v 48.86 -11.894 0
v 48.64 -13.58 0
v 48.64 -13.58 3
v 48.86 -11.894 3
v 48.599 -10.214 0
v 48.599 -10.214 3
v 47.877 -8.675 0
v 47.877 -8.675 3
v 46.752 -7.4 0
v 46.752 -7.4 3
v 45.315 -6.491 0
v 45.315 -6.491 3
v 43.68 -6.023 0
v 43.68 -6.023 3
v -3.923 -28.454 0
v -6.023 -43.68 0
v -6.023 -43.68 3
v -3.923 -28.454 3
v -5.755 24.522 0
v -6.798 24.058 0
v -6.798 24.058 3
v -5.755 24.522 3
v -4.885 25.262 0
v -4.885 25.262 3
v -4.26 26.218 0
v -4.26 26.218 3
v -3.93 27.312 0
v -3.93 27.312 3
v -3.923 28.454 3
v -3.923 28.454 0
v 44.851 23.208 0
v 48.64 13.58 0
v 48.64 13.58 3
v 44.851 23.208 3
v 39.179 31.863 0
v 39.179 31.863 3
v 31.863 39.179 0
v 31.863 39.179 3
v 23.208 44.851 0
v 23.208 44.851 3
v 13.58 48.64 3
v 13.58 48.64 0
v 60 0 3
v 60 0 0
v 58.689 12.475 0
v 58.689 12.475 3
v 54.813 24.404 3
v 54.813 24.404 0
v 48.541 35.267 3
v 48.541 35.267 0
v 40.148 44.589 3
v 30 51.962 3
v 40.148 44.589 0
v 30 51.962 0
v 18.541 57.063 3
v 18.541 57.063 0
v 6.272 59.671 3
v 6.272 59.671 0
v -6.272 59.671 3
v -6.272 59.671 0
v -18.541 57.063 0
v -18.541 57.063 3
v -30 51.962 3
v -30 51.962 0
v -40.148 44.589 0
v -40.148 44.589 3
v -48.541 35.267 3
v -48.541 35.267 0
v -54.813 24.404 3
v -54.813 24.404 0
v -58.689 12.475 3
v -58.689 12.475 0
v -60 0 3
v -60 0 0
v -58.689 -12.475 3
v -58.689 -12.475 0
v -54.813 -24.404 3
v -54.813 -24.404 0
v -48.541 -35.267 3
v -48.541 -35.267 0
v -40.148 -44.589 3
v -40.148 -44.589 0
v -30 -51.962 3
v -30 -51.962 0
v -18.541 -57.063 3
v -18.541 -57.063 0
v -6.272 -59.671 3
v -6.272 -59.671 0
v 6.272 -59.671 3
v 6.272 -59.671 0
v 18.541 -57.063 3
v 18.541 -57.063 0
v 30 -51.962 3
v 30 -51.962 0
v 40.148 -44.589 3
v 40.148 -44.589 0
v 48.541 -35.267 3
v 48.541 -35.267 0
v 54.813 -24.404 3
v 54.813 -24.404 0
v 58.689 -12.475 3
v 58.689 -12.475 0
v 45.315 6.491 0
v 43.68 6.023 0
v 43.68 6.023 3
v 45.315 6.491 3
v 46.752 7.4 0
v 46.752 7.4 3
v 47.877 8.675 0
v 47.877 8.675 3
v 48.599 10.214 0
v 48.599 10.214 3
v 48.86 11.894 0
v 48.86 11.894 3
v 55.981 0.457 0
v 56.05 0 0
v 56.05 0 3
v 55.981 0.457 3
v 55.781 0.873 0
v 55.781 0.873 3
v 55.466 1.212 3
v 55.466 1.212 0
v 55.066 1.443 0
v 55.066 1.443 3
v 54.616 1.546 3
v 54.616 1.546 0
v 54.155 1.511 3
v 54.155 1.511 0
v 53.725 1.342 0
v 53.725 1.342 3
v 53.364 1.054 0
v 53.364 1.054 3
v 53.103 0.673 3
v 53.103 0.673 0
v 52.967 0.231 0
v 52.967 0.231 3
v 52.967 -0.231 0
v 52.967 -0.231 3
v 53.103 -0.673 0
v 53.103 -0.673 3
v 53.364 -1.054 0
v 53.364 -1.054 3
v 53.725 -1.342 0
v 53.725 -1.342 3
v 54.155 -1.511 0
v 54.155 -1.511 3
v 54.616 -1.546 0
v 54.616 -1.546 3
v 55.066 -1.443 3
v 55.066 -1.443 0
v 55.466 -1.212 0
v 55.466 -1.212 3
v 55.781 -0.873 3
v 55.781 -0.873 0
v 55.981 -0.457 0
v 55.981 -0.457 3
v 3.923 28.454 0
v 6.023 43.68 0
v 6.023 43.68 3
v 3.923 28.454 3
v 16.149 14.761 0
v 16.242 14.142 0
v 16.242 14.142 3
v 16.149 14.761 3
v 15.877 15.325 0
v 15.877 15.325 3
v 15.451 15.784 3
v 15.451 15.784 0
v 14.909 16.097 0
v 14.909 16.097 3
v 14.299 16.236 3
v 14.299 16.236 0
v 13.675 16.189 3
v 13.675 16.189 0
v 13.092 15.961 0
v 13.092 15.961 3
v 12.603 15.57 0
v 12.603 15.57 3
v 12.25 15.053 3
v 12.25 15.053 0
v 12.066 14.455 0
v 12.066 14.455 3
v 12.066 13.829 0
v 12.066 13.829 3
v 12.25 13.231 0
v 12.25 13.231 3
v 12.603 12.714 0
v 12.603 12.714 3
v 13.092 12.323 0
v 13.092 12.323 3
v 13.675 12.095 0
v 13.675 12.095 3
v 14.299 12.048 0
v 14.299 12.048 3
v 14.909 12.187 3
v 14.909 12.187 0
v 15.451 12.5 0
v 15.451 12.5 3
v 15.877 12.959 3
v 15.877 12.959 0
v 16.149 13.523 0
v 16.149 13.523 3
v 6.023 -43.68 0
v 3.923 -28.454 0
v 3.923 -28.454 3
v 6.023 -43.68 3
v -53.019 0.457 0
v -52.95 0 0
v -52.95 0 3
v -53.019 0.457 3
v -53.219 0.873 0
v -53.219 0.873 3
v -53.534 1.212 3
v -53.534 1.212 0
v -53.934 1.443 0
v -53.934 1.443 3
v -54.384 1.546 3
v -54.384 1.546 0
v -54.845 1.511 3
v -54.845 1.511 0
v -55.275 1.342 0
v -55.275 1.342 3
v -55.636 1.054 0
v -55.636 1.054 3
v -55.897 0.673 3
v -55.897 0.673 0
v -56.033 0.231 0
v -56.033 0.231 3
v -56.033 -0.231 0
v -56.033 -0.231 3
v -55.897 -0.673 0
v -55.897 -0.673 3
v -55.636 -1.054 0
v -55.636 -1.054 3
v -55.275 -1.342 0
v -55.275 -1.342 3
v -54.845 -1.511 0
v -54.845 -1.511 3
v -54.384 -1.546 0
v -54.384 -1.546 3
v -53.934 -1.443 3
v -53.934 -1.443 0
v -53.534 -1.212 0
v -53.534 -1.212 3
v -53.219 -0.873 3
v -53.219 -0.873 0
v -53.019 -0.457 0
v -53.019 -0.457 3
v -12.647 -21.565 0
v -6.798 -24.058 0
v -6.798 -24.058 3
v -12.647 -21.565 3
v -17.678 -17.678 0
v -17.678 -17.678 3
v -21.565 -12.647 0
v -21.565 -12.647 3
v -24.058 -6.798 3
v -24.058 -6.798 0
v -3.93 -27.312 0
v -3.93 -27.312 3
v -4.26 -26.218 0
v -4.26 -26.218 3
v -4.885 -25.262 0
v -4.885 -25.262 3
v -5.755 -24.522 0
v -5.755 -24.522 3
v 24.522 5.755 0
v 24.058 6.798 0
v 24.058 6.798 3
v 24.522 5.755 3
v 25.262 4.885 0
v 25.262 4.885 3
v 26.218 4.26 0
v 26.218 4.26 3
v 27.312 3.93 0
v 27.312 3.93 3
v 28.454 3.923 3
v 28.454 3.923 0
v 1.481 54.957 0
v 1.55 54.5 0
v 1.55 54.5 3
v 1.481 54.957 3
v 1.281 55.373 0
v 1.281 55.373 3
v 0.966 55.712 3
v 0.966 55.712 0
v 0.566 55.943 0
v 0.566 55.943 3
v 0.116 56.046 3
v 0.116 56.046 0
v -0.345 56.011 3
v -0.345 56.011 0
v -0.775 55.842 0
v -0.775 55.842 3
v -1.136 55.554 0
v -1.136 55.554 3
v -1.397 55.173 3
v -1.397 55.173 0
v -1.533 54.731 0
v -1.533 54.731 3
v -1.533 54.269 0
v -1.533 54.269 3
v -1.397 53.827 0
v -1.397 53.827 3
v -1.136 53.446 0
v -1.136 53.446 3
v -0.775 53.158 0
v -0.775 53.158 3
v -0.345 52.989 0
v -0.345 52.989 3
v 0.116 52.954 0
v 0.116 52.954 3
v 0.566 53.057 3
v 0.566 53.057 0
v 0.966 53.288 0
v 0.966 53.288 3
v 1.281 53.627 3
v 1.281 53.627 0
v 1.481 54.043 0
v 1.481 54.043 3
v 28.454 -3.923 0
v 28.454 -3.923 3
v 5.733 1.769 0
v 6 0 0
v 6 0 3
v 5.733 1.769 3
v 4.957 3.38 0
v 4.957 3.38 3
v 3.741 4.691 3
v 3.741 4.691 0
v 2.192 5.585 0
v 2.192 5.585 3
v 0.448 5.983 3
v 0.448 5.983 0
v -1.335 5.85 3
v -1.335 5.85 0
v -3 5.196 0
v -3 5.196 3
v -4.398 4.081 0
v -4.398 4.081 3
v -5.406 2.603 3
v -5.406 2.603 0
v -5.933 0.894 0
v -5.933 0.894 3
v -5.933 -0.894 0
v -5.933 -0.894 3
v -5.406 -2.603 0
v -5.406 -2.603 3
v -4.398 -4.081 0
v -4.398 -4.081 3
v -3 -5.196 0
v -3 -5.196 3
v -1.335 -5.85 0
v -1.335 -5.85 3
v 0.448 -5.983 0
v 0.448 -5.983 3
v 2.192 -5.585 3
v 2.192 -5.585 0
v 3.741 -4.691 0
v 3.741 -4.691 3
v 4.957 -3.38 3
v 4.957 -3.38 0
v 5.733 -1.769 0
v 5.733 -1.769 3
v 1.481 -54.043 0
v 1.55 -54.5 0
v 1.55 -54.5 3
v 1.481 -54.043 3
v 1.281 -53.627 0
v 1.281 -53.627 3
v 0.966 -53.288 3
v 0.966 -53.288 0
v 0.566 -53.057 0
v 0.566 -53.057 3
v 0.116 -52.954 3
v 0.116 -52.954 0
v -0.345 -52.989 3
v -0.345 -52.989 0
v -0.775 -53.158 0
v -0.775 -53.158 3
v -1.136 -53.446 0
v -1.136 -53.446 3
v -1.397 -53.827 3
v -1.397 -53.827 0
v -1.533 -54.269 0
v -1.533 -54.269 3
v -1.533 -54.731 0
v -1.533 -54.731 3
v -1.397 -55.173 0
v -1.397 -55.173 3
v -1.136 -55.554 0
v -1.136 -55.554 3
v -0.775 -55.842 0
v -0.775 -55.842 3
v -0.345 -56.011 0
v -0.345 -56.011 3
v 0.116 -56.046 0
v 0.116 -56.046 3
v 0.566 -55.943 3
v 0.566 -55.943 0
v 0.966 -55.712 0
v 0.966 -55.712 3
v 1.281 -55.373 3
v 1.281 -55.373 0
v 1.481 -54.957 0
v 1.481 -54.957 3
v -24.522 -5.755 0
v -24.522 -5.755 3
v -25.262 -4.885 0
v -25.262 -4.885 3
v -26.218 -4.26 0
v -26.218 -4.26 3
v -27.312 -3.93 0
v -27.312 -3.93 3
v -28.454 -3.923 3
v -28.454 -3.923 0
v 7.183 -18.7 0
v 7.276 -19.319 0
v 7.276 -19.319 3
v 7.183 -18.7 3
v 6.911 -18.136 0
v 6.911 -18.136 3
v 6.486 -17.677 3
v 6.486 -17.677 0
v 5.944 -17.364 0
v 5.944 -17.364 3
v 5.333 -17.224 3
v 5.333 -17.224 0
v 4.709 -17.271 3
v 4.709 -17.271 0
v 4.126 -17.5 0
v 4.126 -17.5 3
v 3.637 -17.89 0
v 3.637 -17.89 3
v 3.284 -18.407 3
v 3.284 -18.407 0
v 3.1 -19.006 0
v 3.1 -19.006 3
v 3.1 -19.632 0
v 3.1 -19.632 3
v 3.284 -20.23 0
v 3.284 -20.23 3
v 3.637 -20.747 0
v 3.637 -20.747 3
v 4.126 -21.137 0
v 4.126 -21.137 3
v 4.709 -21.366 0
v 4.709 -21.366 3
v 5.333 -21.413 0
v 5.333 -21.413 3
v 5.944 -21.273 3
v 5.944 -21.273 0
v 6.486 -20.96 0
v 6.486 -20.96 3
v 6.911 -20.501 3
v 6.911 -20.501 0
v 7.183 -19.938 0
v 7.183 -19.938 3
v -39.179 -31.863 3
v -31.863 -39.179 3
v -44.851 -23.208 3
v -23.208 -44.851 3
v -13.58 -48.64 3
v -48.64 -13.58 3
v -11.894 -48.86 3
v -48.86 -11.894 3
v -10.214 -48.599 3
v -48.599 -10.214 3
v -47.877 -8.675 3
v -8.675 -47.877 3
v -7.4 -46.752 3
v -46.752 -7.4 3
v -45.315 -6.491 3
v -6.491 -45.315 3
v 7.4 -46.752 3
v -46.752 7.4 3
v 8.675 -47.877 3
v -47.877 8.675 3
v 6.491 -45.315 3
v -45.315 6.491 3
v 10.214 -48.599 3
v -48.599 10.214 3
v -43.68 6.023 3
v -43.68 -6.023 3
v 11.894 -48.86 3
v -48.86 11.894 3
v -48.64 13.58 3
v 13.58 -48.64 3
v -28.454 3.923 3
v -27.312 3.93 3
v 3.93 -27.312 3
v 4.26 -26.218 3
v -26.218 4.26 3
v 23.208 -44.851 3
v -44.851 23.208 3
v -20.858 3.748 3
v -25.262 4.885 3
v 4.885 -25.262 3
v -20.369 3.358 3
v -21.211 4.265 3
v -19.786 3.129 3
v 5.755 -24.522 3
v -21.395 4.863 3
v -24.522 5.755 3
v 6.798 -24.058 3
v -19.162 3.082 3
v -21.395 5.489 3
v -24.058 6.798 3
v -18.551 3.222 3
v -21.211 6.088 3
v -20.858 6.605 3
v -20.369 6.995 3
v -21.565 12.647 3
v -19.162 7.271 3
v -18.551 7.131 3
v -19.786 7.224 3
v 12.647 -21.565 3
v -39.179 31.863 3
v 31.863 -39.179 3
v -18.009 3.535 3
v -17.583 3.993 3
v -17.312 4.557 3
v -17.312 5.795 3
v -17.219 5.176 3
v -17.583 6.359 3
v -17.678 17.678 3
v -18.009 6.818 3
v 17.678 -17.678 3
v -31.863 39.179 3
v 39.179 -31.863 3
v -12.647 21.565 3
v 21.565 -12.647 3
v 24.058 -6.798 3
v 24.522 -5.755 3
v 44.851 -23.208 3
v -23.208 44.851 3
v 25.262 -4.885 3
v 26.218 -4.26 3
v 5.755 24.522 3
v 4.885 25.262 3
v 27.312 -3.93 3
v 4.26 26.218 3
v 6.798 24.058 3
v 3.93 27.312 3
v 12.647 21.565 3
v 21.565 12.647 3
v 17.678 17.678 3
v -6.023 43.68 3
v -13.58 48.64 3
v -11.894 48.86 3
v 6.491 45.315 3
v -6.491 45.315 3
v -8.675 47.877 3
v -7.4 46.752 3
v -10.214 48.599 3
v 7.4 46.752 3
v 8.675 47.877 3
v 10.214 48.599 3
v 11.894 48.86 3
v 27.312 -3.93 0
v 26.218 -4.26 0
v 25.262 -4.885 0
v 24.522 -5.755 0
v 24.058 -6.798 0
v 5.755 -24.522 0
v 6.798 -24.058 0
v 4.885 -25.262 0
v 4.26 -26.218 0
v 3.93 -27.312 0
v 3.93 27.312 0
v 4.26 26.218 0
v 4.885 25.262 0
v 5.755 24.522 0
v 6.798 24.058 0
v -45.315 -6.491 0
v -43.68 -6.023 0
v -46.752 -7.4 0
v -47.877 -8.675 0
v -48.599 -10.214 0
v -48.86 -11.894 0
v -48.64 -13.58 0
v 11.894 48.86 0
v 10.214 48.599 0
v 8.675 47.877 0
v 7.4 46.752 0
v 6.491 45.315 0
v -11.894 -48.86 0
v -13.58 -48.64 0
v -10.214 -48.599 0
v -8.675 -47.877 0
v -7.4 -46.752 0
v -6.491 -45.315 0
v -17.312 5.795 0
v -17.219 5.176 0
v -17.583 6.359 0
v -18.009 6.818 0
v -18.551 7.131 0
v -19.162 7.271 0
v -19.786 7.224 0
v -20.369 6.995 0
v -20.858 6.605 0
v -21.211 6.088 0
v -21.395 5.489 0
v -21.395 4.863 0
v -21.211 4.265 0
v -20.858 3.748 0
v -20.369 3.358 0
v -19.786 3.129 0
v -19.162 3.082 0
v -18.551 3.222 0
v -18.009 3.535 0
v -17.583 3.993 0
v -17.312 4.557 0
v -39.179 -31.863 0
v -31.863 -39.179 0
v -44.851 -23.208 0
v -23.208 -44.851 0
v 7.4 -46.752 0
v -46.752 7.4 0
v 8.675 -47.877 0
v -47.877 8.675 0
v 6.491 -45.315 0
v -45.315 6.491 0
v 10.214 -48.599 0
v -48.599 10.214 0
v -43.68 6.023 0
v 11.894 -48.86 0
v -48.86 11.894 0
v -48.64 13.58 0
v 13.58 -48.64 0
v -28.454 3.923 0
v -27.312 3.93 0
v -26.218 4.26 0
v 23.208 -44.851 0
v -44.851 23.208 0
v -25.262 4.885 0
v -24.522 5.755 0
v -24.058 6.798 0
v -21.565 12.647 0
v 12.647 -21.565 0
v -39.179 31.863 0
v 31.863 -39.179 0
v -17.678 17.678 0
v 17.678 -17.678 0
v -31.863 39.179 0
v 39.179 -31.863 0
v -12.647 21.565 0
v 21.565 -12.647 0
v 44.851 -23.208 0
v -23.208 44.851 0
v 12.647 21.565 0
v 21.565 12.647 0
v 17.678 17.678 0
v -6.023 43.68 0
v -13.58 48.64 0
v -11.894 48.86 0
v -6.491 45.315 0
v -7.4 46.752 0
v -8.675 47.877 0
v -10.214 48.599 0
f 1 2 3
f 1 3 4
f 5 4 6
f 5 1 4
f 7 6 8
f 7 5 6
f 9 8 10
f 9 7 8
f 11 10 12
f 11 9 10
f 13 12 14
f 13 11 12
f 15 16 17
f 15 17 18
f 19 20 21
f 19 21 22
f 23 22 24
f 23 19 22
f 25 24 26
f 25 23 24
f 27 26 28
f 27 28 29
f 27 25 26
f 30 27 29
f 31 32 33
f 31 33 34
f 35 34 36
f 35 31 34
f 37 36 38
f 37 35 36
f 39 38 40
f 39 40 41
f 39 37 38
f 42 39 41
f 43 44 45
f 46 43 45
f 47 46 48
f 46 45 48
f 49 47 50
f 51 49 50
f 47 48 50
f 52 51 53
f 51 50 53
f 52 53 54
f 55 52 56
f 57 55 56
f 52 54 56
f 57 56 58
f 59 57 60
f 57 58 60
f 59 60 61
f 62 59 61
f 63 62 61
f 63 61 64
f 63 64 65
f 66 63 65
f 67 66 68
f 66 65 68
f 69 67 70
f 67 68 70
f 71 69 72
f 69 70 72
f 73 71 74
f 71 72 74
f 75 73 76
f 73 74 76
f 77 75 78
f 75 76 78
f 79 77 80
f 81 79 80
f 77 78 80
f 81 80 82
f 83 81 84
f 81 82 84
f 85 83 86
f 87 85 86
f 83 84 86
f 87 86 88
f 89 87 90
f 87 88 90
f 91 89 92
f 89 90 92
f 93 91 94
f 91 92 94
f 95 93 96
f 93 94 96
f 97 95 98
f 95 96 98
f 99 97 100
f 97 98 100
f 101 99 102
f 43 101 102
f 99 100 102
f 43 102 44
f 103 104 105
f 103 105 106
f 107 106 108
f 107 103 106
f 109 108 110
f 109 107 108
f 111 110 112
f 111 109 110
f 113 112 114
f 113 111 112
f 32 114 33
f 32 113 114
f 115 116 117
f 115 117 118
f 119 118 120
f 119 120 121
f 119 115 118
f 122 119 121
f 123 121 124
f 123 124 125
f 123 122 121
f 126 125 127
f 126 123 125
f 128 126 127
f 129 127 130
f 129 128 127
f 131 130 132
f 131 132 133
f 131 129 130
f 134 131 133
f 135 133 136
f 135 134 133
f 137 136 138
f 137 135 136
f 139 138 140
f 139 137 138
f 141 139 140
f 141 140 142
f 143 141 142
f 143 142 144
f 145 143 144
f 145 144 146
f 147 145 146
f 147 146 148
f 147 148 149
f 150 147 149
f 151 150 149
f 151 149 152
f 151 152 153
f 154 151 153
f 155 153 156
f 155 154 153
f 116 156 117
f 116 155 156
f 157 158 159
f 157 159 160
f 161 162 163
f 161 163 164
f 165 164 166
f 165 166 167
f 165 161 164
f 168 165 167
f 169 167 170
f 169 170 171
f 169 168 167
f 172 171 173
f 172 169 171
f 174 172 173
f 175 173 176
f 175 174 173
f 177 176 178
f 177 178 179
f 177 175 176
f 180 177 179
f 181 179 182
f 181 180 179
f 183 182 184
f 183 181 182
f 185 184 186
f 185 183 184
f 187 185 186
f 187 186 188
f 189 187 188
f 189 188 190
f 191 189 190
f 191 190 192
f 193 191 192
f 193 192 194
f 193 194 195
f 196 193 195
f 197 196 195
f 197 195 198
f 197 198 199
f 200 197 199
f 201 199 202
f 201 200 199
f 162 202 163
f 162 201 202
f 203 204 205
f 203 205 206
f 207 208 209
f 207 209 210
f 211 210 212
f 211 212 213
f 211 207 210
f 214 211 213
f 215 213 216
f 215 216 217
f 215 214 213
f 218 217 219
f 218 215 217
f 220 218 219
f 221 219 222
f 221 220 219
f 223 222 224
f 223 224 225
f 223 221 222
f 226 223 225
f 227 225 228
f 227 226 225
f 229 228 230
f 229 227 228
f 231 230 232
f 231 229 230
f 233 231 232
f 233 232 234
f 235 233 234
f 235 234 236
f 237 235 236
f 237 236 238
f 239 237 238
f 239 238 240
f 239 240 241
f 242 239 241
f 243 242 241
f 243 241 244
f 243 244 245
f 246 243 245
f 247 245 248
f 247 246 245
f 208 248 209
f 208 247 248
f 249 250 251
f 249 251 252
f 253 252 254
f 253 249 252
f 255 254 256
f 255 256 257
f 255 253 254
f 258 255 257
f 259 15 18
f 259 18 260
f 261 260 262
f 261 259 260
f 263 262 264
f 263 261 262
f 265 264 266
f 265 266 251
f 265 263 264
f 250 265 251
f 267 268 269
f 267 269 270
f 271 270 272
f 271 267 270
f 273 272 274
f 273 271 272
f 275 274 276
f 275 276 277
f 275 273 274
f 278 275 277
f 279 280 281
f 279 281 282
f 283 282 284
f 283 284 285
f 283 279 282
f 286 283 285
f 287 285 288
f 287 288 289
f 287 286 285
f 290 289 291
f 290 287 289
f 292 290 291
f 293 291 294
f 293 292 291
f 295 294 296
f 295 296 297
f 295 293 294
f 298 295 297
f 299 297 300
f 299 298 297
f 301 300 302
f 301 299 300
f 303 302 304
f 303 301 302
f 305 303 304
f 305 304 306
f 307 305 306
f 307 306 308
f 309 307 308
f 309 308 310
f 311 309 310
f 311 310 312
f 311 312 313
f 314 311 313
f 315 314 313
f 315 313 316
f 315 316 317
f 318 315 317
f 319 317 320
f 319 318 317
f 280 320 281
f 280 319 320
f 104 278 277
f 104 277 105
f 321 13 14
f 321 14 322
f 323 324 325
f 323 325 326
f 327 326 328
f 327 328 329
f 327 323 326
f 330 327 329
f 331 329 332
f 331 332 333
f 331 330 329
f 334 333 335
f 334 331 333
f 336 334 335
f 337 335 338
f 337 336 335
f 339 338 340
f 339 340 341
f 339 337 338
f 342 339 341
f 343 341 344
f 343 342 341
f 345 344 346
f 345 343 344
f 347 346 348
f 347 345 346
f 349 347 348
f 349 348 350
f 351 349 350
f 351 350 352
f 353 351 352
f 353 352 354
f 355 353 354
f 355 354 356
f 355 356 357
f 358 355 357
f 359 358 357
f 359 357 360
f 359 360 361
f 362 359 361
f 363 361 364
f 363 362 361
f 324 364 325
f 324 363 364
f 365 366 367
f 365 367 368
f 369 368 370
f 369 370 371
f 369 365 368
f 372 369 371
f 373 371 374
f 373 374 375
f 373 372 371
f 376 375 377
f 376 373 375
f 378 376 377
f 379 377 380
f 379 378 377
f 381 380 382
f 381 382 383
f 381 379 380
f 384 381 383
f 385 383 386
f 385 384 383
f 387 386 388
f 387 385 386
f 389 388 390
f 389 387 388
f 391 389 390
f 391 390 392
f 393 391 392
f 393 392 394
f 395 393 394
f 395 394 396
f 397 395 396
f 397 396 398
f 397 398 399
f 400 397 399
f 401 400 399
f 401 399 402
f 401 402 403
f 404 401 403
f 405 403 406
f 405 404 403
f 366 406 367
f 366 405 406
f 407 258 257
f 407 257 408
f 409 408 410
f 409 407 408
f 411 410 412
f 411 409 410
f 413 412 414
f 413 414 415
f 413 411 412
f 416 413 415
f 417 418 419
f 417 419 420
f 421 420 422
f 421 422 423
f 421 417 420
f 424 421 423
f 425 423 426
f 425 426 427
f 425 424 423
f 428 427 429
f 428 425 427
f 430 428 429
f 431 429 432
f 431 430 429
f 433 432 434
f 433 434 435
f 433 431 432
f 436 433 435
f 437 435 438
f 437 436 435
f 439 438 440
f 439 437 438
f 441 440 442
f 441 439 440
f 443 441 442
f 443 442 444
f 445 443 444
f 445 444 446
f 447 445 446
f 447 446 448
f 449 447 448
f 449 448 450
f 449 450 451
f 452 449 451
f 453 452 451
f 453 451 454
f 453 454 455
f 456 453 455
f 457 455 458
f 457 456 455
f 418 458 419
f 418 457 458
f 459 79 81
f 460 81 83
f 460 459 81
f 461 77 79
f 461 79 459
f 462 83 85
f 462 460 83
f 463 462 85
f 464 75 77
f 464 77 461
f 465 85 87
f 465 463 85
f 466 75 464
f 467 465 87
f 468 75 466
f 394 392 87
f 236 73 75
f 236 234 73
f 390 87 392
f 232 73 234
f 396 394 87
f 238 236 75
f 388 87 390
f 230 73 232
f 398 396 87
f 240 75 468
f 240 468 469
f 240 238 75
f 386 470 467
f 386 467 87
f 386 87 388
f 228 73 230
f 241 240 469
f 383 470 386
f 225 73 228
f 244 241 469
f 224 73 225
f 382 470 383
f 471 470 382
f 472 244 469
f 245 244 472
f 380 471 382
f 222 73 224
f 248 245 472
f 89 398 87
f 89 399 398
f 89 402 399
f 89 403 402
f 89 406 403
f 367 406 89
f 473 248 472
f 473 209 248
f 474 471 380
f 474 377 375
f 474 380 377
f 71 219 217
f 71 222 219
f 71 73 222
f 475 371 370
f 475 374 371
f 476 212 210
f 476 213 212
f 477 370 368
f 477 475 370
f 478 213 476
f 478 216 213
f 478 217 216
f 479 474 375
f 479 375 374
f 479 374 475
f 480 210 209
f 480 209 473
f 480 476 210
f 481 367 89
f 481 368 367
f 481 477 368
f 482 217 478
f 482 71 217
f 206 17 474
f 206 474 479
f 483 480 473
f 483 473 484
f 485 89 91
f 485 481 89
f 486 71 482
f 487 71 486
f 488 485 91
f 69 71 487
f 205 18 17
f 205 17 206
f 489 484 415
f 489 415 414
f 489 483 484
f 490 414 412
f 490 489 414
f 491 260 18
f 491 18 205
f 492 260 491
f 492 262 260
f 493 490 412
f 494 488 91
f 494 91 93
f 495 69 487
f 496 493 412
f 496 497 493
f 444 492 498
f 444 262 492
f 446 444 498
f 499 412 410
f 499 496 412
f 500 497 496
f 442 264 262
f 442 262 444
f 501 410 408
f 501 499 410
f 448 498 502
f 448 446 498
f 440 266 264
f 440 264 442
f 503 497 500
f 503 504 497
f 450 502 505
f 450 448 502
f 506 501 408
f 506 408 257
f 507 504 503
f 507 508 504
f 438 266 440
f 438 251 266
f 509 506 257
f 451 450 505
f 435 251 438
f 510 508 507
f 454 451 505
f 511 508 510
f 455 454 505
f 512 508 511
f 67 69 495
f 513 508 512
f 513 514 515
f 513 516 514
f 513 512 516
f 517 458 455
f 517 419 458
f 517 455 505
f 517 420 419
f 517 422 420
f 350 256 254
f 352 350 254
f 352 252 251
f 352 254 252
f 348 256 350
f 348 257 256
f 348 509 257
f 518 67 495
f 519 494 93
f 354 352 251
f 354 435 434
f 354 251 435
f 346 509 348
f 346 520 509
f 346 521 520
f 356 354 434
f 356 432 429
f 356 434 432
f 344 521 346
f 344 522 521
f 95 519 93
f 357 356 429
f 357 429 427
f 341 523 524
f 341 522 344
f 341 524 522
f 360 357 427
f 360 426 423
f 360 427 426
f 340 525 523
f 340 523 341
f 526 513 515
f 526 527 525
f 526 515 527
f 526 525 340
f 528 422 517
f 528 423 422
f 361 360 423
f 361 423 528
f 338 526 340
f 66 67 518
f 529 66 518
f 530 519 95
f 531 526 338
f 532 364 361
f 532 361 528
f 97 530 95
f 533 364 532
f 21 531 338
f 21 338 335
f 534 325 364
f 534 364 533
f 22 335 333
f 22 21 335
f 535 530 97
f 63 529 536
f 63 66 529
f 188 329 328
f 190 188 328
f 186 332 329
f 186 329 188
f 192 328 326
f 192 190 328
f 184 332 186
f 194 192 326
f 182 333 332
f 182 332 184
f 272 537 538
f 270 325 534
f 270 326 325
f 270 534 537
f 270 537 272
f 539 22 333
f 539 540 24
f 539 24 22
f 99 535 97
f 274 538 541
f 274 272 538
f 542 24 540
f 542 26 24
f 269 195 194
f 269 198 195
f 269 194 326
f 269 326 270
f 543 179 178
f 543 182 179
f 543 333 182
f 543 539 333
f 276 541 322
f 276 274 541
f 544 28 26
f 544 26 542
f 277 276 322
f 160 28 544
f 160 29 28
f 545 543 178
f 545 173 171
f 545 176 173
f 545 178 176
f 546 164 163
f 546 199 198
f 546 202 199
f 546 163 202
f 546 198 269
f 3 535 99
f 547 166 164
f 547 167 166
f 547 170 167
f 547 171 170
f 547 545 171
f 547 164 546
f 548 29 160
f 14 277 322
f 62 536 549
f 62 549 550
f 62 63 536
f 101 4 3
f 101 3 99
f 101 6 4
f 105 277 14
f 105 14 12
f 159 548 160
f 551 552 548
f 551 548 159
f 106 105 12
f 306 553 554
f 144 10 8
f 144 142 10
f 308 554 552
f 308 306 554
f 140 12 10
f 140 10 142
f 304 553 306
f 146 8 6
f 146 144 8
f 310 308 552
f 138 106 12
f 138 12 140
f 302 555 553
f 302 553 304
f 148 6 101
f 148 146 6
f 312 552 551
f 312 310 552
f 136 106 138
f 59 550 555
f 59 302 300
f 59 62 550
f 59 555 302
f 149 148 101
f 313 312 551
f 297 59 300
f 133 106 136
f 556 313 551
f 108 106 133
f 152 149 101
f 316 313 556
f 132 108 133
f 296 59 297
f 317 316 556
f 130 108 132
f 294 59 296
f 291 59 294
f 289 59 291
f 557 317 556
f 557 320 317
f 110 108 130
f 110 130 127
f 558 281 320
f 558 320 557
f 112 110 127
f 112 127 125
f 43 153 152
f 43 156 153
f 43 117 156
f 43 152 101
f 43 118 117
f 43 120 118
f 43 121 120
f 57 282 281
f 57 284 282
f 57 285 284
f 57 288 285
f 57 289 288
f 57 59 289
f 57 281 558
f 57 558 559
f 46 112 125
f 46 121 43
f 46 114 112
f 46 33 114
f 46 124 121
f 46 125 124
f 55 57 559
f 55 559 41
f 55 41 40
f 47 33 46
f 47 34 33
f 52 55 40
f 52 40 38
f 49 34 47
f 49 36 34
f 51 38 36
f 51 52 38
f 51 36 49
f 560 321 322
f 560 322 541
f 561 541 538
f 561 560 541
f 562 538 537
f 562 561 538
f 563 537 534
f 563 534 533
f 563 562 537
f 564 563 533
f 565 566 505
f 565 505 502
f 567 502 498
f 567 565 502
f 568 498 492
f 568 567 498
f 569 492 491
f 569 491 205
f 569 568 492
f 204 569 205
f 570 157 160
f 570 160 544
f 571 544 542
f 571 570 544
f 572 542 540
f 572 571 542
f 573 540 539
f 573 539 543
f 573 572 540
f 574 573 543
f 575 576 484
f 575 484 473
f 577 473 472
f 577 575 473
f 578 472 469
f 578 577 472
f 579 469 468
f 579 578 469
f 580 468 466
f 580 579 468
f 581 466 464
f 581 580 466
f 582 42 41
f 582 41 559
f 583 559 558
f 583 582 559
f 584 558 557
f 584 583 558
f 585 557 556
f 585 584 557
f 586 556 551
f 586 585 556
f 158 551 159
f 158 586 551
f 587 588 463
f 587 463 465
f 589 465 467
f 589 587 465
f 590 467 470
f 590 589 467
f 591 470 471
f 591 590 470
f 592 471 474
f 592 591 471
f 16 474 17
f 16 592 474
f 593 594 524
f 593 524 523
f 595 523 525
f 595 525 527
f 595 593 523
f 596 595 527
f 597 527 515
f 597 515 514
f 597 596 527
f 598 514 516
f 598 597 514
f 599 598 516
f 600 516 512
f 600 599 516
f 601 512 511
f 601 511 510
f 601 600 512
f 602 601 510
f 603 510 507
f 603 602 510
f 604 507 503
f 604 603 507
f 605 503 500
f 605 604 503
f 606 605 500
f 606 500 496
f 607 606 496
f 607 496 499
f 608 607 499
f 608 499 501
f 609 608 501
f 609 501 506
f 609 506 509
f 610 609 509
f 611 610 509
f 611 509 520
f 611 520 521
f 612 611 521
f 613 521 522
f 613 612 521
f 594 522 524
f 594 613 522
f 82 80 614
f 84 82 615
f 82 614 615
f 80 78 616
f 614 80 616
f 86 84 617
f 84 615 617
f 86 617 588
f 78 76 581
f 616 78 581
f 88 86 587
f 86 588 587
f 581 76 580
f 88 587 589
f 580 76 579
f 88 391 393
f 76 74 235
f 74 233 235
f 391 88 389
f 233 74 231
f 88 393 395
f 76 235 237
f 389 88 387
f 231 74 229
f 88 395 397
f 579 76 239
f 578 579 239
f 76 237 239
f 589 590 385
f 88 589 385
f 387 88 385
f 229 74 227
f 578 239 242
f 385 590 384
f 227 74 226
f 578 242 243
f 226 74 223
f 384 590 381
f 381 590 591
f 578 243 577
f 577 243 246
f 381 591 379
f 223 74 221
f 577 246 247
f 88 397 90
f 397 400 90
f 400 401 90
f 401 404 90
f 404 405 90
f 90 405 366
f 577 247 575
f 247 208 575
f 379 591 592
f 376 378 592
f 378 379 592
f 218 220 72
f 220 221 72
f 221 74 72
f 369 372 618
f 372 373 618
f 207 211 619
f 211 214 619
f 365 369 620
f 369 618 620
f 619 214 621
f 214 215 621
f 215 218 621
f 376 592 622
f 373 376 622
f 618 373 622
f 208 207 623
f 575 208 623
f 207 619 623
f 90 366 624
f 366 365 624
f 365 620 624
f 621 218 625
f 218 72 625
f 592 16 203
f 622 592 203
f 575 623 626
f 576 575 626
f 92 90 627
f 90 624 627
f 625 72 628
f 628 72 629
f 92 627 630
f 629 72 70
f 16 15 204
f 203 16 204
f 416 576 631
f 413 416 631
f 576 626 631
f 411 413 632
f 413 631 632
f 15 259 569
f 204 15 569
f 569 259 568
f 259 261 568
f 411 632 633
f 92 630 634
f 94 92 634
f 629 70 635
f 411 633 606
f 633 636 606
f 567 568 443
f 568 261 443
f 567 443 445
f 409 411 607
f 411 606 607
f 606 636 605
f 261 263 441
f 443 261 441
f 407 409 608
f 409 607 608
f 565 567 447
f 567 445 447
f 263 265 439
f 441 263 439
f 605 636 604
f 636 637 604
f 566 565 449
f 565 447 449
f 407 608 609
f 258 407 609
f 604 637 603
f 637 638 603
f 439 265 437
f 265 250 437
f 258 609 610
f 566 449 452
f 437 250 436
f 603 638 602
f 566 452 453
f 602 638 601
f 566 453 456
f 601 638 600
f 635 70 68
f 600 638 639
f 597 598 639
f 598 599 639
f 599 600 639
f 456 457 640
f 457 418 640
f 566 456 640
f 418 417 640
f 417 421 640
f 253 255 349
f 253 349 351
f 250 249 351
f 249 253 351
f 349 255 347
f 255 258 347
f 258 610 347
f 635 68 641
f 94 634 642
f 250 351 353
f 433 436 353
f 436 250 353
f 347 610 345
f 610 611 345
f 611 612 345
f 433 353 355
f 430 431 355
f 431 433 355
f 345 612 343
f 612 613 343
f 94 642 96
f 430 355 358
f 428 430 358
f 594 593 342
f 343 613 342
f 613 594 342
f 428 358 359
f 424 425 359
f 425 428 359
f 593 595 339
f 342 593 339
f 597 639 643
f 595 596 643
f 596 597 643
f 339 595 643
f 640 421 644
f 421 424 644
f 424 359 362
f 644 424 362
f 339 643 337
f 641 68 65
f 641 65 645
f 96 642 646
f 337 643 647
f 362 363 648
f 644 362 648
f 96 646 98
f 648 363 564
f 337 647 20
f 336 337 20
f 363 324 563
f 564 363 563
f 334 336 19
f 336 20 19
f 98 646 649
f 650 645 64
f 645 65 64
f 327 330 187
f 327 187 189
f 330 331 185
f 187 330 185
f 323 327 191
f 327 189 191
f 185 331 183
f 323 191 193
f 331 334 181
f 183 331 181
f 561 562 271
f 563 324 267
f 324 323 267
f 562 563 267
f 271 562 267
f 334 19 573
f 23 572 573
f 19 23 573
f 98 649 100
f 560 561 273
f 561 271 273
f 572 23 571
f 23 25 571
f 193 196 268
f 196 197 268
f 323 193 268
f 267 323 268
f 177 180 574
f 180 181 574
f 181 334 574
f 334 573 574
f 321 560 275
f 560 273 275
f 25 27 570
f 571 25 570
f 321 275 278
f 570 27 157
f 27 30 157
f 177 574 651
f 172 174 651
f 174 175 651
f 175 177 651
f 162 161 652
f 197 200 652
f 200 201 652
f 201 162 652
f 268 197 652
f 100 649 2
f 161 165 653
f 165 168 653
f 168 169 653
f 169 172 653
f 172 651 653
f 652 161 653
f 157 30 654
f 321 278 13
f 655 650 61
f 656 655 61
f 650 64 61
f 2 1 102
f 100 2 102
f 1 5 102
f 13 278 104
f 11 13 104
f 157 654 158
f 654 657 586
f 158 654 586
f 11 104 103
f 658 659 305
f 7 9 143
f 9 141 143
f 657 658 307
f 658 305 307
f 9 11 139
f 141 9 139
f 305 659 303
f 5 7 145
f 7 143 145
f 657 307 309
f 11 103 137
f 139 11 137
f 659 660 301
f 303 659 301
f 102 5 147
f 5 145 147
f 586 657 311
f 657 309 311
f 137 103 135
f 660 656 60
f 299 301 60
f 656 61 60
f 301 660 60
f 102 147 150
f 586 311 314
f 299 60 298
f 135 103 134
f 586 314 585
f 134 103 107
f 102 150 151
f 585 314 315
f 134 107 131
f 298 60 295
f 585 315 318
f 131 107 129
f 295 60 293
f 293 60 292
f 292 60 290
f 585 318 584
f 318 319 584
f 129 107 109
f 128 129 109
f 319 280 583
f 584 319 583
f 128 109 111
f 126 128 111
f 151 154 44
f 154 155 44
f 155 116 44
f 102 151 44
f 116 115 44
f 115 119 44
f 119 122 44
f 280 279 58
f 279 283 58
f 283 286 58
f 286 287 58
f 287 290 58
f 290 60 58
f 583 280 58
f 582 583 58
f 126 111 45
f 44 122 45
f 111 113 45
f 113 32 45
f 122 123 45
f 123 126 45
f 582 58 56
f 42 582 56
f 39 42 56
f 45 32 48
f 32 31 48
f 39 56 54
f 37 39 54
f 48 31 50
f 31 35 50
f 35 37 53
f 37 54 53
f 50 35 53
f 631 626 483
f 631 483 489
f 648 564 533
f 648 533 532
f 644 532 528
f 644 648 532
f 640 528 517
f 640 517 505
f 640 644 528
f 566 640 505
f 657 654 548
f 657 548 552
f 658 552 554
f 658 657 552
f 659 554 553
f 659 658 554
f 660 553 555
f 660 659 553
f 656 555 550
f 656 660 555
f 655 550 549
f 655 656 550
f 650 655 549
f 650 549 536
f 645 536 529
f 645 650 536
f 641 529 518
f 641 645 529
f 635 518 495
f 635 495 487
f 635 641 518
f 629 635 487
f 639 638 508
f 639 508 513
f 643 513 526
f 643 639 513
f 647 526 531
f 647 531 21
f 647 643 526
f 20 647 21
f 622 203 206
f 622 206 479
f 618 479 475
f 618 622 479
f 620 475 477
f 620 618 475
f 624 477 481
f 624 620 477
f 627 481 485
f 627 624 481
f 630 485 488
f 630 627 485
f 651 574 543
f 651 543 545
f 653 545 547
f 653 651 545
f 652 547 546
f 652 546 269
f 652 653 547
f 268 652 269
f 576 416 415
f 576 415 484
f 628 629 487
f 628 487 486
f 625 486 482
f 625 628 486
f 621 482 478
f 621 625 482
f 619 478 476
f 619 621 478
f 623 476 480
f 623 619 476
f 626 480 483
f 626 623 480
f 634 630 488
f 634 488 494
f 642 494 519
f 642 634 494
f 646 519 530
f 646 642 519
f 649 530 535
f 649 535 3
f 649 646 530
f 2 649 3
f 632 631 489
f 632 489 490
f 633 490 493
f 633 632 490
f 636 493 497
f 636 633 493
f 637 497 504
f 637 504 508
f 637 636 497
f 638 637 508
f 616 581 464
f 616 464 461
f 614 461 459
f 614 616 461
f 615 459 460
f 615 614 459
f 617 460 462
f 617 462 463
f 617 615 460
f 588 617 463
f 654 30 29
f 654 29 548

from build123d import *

# Parameters (mm, degrees)
SKETCH_1_R      = 60
SKETCH_1_R_2    = 1.55
SKETCH_1_R_3    = 2.1
SKETCH_1_R_4    = 6
EXTRUDE_1_DEPTH = 3


with BuildPart() as part:
    # 草图1 → 凸台-拉伸1 (new body)
    with BuildSketch(Plane.XY):
        Circle(SKETCH_1_R)
        with Locations((0, 54.5)):
            Circle(SKETCH_1_R_2, mode=Mode.SUBTRACT)
        with Locations((-54.5, 0)):
            Circle(SKETCH_1_R_2, mode=Mode.SUBTRACT)
        with Locations((0, -54.5)):
            Circle(SKETCH_1_R_2, mode=Mode.SUBTRACT)
        with Locations((54.5, 0)):
            Circle(SKETCH_1_R_2, mode=Mode.SUBTRACT)
        with Locations((14.142135624, 14.142135624)):
            Circle(SKETCH_1_R_3, mode=Mode.SUBTRACT)
        with Locations((5.176380902, -19.318516526)):
            Circle(SKETCH_1_R_3, mode=Mode.SUBTRACT)
        with Locations((-19.318516526, 5.176380902)):
            Circle(SKETCH_1_R_3, mode=Mode.SUBTRACT)
        Circle(SKETCH_1_R_4, mode=Mode.SUBTRACT)
        with BuildLine():
            Line((3.923217687, -28.453617749), (6.022703538, -43.680396542))
            ThreePointArc((6.022703538, -43.680396542), (8.67451724, -47.877141015), (13.579927123, -48.639855873))
            ThreePointArc((13.579927123, -48.639855873), (35.70889245, -35.70889245), (48.639855873, -13.579927123))
            ThreePointArc((48.639855873, -13.579927123), (47.877141015, -8.67451724), (43.680396542, -6.022703538))
            Line((43.680396542, -6.022703538), (28.453617749, -3.923217687))
            ThreePointArc((28.453617749, -3.923217687), (25.717860997, -4.538114468), (24.057984584, -6.7980422))
            ThreePointArc((24.057984584, -6.7980422), (17.67766953, -17.67766953), (6.7980422, -24.057984584))
            ThreePointArc((6.7980422, -24.057984584), (4.538114468, -25.717860997), (3.923217687, -28.453617749))
        make_face(mode=Mode.SUBTRACT)
        with BuildLine():
            Line((28.453617749, 3.923217687), (43.680396542, 6.022703538))
            ThreePointArc((43.680396542, 6.022703538), (47.877141015, 8.67451724), (48.639855873, 13.579927123))
            ThreePointArc((48.639855873, 13.579927123), (35.70889245, 35.70889245), (13.579927123, 48.639855873))
            ThreePointArc((13.579927123, 48.639855873), (8.67451724, 47.877141015), (6.022703538, 43.680396542))
            Line((6.022703538, 43.680396542), (3.923217687, 28.453617749))
            ThreePointArc((3.923217687, 28.453617749), (4.538114468, 25.717860997), (6.7980422, 24.057984584))
            ThreePointArc((6.7980422, 24.057984584), (17.67766953, 17.67766953), (24.057984584, 6.7980422))
            ThreePointArc((24.057984584, 6.7980422), (25.717860997, 4.538114468), (28.453617749, 3.923217687))
        make_face(mode=Mode.SUBTRACT)
        with BuildLine():
            Line((-28.453617749, -3.923217687), (-43.680396542, -6.022703538))
            ThreePointArc((-43.680396542, -6.022703538), (-47.877141015, -8.67451724), (-48.639855873, -13.579927123))
            ThreePointArc((-48.639855873, -13.579927123), (-35.70889245, -35.70889245), (-13.579927123, -48.639855873))
            ThreePointArc((-13.579927123, -48.639855873), (-8.67451724, -47.877141015), (-6.022703538, -43.680396542))
            Line((-6.022703538, -43.680396542), (-3.923217687, -28.453617749))
            ThreePointArc((-3.923217687, -28.453617749), (-4.538114468, -25.717860997), (-6.7980422, -24.057984584))
            ThreePointArc((-6.7980422, -24.057984584), (-17.67766953, -17.67766953), (-24.057984584, -6.7980422))
            ThreePointArc((-24.057984584, -6.7980422), (-25.717860997, -4.538114468), (-28.453617749, -3.923217687))
        make_face(mode=Mode.SUBTRACT)
        with BuildLine():
            Line((-3.923217687, 28.453617749), (-6.022703538, 43.680396542))
            ThreePointArc((-6.022703538, 43.680396542), (-8.67451724, 47.877141015), (-13.579927123, 48.639855873))
            ThreePointArc((-13.579927123, 48.639855873), (-35.70889245, 35.70889245), (-48.639855873, 13.579927123))
            ThreePointArc((-48.639855873, 13.579927123), (-47.877141015, 8.67451724), (-43.680396542, 6.022703538))
            Line((-43.680396542, 6.022703538), (-28.453617749, 3.923217687))
            ThreePointArc((-28.453617749, 3.923217687), (-25.717860997, 4.538114468), (-24.057984584, 6.7980422))
            ThreePointArc((-24.057984584, 6.7980422), (-17.67766953, 17.67766953), (-6.7980422, 24.057984584))
            ThreePointArc((-6.7980422, 24.057984584), (-4.538114468, 25.717860997), (-3.923217687, 28.453617749))
        make_face(mode=Mode.SUBTRACT)
    extrude(amount=EXTRUDE_1_DEPTH)


solid = part.part
